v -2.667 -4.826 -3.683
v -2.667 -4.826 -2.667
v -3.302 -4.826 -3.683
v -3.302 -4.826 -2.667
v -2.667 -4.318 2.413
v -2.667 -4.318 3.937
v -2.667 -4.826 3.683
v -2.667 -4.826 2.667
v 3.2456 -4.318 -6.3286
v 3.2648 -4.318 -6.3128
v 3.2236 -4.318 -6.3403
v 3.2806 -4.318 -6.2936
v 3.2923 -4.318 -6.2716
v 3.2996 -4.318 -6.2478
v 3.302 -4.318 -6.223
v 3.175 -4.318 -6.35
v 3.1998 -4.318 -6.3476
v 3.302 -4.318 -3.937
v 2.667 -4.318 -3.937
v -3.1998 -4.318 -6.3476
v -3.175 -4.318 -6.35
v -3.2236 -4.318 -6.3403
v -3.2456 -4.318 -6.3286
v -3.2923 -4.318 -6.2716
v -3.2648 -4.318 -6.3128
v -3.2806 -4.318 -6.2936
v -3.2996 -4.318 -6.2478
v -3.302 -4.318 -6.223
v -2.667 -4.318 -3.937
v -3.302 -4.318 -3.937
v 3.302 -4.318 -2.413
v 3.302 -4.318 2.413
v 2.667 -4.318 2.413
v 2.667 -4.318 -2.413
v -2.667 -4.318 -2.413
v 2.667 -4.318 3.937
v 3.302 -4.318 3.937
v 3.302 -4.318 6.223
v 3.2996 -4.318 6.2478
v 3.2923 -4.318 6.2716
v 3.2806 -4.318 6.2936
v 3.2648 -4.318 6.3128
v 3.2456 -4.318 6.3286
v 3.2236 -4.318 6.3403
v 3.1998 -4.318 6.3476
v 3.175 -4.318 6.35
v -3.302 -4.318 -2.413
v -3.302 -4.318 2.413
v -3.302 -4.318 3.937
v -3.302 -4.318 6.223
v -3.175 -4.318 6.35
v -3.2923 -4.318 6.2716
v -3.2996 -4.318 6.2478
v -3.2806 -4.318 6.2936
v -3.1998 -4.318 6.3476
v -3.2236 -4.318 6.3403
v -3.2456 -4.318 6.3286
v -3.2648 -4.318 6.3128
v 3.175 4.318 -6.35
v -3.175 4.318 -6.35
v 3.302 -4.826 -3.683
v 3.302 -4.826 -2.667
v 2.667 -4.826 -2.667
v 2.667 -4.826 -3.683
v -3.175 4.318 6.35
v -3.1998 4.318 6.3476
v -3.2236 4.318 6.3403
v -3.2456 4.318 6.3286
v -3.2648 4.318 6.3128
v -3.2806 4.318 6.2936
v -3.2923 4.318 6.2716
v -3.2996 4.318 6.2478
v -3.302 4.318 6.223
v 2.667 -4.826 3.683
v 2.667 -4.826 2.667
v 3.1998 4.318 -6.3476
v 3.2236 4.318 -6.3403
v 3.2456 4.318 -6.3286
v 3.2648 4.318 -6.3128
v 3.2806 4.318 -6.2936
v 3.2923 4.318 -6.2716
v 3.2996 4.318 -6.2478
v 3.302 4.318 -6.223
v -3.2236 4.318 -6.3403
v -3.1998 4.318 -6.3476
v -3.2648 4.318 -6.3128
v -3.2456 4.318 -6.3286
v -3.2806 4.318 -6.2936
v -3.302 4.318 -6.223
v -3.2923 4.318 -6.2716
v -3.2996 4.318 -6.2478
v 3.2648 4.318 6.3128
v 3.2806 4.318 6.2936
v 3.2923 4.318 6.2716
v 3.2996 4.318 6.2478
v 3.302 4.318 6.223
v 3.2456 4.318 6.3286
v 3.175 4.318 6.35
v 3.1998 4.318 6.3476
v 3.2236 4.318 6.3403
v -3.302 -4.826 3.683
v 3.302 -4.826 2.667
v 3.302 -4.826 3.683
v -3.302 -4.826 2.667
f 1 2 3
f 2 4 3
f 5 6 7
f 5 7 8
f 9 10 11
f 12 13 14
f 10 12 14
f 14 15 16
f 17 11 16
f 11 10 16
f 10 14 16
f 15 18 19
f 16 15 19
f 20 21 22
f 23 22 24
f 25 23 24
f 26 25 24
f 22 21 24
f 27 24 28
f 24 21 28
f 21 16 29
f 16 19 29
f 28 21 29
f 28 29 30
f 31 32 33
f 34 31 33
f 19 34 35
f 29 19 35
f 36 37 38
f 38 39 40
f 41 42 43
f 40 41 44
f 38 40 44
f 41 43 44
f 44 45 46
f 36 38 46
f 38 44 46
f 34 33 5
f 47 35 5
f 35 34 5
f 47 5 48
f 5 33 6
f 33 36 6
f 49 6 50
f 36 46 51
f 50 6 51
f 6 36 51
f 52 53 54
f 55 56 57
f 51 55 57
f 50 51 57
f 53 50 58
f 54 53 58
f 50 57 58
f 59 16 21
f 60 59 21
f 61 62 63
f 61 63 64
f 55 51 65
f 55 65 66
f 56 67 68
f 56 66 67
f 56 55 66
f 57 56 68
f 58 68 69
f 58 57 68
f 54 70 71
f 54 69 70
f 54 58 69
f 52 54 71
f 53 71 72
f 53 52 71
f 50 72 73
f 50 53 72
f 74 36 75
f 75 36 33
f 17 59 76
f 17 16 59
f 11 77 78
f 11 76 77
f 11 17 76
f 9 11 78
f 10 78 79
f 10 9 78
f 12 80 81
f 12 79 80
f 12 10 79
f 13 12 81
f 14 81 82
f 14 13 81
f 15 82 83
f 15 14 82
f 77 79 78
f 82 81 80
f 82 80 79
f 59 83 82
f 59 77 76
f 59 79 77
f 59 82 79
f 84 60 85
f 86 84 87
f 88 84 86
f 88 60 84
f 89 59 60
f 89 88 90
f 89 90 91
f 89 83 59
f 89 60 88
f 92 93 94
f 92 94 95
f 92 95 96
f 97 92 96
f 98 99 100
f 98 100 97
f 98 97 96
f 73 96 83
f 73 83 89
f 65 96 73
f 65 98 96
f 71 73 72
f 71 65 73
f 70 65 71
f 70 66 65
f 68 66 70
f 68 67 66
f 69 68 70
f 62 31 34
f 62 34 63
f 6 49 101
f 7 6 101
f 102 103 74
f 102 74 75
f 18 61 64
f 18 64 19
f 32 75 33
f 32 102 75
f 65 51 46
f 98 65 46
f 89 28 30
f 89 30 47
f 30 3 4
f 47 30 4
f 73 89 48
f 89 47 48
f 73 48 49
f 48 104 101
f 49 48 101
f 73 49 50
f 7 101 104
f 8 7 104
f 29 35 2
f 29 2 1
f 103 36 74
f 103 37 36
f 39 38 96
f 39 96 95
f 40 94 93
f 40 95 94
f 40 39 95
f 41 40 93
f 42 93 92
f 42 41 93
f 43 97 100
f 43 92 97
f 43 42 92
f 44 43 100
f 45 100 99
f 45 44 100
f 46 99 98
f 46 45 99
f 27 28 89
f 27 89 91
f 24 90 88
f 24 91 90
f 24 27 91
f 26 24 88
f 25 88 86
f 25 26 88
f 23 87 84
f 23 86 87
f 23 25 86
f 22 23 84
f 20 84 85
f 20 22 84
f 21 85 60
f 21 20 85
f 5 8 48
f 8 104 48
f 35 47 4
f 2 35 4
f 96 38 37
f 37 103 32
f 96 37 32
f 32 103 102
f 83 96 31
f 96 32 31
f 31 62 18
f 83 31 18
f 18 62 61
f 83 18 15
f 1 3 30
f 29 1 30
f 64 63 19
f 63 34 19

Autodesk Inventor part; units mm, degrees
sketch "Sketch_1" plane through (0, 0, 0) normal (0, 1, 0) x (-1, 0, 0)
  line L0 (3.302, -6.223) -> (3.302, 6.223)
  arc A0 (3.302, 6.223) -> (3.175, 6.35) centre (3.175, 6.223) ccw
  line L1 (3.175, 6.35) -> (-3.175, 6.35)
  arc A1 (-3.175, 6.35) -> (-3.302, 6.223) centre (-3.175, 6.223) ccw
  line L2 (-3.302, 6.223) -> (-3.302, -6.223)
  arc A2 (-3.302, -6.223) -> (-3.175, -6.35) centre (-3.175, -6.223) ccw
  line L3 (-3.175, -6.35) -> (3.175, -6.35)
  arc A3 (3.175, -6.35) -> (3.302, -6.223) centre (3.175, -6.223) ccw
extrude "Extrusion1" add sketch "Sketch_1" along normal mid plane 8.636
sketch "Sketch_2" plane through (3.302, 0, 0) normal (1, 0, 0) x (0, 0, -1)
  line L0 (-3.937, -4.318) -> (-3.683, -4.826)
  line L1 (-3.683, -4.826) -> (-2.667, -4.826)
  line L2 (-2.667, -4.826) -> (-2.413, -4.318)
  line L3 (-2.413, -4.318) -> (-3.937, -4.318)
extrude "Extrusion2" add sketch "Sketch_2" against normal blind 0.635
sketch "Sketch_3" plane through (3.302, 0, 0) normal (1, 0, 0) x (0, 0, -1)
  line L0 (2.413, -4.318) -> (2.667, -4.826)
  line L1 (2.667, -4.826) -> (3.683, -4.826)
  line L2 (3.683, -4.826) -> (3.937, -4.318)
  line L3 (3.937, -4.318) -> (2.413, -4.318)
extrude "Extrusion3" add sketch "Sketch_3" against normal blind 0.635
sketch "Sketch_4" plane through (-3.302, 0, 0) normal (1, 0, 0) x (0, 0, -1)
  line L0 (-3.937, -4.318) -> (-3.683, -4.826)
  line L1 (-3.683, -4.826) -> (-2.667, -4.826)
  line L2 (-2.667, -4.826) -> (-2.413, -4.318)
  line L3 (-2.413, -4.318) -> (-3.937, -4.318)
extrude "Extrusion4" add sketch "Sketch_4" along normal blind 0.635
sketch "Sketch_5" plane through (-3.302, 0, 0) normal (1, 0, 0) x (0, 0, -1)
  line L0 (2.413, -4.318) -> (2.667, -4.826)
  line L1 (2.667, -4.826) -> (3.683, -4.826)
  line L2 (3.683, -4.826) -> (3.937, -4.318)
  line L3 (3.937, -4.318) -> (2.413, -4.318)
extrude "Extrusion5" add sketch "Sketch_5" along normal blind 0.635
ref_plane "bushing_XY" through (0, 4.318, 0) normal (0, -1, 0) x (1, 0, 0)
ref_plane "bushing_YZ" through (0, 4.318, 0) normal (1, 0, 0) x (0, 0, 1)
ref_plane "bushing_ZX" through (0, 4.318, 0) normal (0, 0, 1) x (0, -1, 0)
ref_plane "dummy_body_XY" through (0, 0, 0) normal (0, 1, 0) x (1, 0, 0)
ref_plane "dummy_body_YZ" through (0, 0, 0) normal (1, 0, 0) x (0, 0, -1)
ref_plane "dummy_body_ZX" through (0, 0, 0) normal (0, 0, -1) x (0, 1, 0)
ref_plane "terminals_XY" through (0, -4.191, 0) normal (0, 1, 0) x (1, 0, 0)
ref_plane "terminals_YZ" through (0, -4.191, 0) normal (1, 0, 0) x (0, 0, -1)
ref_plane "terminals_ZX" through (0, -4.191, 0) normal (0, 0, -1) x (0, 1, 0)
properties part number "M2T1S03body"
